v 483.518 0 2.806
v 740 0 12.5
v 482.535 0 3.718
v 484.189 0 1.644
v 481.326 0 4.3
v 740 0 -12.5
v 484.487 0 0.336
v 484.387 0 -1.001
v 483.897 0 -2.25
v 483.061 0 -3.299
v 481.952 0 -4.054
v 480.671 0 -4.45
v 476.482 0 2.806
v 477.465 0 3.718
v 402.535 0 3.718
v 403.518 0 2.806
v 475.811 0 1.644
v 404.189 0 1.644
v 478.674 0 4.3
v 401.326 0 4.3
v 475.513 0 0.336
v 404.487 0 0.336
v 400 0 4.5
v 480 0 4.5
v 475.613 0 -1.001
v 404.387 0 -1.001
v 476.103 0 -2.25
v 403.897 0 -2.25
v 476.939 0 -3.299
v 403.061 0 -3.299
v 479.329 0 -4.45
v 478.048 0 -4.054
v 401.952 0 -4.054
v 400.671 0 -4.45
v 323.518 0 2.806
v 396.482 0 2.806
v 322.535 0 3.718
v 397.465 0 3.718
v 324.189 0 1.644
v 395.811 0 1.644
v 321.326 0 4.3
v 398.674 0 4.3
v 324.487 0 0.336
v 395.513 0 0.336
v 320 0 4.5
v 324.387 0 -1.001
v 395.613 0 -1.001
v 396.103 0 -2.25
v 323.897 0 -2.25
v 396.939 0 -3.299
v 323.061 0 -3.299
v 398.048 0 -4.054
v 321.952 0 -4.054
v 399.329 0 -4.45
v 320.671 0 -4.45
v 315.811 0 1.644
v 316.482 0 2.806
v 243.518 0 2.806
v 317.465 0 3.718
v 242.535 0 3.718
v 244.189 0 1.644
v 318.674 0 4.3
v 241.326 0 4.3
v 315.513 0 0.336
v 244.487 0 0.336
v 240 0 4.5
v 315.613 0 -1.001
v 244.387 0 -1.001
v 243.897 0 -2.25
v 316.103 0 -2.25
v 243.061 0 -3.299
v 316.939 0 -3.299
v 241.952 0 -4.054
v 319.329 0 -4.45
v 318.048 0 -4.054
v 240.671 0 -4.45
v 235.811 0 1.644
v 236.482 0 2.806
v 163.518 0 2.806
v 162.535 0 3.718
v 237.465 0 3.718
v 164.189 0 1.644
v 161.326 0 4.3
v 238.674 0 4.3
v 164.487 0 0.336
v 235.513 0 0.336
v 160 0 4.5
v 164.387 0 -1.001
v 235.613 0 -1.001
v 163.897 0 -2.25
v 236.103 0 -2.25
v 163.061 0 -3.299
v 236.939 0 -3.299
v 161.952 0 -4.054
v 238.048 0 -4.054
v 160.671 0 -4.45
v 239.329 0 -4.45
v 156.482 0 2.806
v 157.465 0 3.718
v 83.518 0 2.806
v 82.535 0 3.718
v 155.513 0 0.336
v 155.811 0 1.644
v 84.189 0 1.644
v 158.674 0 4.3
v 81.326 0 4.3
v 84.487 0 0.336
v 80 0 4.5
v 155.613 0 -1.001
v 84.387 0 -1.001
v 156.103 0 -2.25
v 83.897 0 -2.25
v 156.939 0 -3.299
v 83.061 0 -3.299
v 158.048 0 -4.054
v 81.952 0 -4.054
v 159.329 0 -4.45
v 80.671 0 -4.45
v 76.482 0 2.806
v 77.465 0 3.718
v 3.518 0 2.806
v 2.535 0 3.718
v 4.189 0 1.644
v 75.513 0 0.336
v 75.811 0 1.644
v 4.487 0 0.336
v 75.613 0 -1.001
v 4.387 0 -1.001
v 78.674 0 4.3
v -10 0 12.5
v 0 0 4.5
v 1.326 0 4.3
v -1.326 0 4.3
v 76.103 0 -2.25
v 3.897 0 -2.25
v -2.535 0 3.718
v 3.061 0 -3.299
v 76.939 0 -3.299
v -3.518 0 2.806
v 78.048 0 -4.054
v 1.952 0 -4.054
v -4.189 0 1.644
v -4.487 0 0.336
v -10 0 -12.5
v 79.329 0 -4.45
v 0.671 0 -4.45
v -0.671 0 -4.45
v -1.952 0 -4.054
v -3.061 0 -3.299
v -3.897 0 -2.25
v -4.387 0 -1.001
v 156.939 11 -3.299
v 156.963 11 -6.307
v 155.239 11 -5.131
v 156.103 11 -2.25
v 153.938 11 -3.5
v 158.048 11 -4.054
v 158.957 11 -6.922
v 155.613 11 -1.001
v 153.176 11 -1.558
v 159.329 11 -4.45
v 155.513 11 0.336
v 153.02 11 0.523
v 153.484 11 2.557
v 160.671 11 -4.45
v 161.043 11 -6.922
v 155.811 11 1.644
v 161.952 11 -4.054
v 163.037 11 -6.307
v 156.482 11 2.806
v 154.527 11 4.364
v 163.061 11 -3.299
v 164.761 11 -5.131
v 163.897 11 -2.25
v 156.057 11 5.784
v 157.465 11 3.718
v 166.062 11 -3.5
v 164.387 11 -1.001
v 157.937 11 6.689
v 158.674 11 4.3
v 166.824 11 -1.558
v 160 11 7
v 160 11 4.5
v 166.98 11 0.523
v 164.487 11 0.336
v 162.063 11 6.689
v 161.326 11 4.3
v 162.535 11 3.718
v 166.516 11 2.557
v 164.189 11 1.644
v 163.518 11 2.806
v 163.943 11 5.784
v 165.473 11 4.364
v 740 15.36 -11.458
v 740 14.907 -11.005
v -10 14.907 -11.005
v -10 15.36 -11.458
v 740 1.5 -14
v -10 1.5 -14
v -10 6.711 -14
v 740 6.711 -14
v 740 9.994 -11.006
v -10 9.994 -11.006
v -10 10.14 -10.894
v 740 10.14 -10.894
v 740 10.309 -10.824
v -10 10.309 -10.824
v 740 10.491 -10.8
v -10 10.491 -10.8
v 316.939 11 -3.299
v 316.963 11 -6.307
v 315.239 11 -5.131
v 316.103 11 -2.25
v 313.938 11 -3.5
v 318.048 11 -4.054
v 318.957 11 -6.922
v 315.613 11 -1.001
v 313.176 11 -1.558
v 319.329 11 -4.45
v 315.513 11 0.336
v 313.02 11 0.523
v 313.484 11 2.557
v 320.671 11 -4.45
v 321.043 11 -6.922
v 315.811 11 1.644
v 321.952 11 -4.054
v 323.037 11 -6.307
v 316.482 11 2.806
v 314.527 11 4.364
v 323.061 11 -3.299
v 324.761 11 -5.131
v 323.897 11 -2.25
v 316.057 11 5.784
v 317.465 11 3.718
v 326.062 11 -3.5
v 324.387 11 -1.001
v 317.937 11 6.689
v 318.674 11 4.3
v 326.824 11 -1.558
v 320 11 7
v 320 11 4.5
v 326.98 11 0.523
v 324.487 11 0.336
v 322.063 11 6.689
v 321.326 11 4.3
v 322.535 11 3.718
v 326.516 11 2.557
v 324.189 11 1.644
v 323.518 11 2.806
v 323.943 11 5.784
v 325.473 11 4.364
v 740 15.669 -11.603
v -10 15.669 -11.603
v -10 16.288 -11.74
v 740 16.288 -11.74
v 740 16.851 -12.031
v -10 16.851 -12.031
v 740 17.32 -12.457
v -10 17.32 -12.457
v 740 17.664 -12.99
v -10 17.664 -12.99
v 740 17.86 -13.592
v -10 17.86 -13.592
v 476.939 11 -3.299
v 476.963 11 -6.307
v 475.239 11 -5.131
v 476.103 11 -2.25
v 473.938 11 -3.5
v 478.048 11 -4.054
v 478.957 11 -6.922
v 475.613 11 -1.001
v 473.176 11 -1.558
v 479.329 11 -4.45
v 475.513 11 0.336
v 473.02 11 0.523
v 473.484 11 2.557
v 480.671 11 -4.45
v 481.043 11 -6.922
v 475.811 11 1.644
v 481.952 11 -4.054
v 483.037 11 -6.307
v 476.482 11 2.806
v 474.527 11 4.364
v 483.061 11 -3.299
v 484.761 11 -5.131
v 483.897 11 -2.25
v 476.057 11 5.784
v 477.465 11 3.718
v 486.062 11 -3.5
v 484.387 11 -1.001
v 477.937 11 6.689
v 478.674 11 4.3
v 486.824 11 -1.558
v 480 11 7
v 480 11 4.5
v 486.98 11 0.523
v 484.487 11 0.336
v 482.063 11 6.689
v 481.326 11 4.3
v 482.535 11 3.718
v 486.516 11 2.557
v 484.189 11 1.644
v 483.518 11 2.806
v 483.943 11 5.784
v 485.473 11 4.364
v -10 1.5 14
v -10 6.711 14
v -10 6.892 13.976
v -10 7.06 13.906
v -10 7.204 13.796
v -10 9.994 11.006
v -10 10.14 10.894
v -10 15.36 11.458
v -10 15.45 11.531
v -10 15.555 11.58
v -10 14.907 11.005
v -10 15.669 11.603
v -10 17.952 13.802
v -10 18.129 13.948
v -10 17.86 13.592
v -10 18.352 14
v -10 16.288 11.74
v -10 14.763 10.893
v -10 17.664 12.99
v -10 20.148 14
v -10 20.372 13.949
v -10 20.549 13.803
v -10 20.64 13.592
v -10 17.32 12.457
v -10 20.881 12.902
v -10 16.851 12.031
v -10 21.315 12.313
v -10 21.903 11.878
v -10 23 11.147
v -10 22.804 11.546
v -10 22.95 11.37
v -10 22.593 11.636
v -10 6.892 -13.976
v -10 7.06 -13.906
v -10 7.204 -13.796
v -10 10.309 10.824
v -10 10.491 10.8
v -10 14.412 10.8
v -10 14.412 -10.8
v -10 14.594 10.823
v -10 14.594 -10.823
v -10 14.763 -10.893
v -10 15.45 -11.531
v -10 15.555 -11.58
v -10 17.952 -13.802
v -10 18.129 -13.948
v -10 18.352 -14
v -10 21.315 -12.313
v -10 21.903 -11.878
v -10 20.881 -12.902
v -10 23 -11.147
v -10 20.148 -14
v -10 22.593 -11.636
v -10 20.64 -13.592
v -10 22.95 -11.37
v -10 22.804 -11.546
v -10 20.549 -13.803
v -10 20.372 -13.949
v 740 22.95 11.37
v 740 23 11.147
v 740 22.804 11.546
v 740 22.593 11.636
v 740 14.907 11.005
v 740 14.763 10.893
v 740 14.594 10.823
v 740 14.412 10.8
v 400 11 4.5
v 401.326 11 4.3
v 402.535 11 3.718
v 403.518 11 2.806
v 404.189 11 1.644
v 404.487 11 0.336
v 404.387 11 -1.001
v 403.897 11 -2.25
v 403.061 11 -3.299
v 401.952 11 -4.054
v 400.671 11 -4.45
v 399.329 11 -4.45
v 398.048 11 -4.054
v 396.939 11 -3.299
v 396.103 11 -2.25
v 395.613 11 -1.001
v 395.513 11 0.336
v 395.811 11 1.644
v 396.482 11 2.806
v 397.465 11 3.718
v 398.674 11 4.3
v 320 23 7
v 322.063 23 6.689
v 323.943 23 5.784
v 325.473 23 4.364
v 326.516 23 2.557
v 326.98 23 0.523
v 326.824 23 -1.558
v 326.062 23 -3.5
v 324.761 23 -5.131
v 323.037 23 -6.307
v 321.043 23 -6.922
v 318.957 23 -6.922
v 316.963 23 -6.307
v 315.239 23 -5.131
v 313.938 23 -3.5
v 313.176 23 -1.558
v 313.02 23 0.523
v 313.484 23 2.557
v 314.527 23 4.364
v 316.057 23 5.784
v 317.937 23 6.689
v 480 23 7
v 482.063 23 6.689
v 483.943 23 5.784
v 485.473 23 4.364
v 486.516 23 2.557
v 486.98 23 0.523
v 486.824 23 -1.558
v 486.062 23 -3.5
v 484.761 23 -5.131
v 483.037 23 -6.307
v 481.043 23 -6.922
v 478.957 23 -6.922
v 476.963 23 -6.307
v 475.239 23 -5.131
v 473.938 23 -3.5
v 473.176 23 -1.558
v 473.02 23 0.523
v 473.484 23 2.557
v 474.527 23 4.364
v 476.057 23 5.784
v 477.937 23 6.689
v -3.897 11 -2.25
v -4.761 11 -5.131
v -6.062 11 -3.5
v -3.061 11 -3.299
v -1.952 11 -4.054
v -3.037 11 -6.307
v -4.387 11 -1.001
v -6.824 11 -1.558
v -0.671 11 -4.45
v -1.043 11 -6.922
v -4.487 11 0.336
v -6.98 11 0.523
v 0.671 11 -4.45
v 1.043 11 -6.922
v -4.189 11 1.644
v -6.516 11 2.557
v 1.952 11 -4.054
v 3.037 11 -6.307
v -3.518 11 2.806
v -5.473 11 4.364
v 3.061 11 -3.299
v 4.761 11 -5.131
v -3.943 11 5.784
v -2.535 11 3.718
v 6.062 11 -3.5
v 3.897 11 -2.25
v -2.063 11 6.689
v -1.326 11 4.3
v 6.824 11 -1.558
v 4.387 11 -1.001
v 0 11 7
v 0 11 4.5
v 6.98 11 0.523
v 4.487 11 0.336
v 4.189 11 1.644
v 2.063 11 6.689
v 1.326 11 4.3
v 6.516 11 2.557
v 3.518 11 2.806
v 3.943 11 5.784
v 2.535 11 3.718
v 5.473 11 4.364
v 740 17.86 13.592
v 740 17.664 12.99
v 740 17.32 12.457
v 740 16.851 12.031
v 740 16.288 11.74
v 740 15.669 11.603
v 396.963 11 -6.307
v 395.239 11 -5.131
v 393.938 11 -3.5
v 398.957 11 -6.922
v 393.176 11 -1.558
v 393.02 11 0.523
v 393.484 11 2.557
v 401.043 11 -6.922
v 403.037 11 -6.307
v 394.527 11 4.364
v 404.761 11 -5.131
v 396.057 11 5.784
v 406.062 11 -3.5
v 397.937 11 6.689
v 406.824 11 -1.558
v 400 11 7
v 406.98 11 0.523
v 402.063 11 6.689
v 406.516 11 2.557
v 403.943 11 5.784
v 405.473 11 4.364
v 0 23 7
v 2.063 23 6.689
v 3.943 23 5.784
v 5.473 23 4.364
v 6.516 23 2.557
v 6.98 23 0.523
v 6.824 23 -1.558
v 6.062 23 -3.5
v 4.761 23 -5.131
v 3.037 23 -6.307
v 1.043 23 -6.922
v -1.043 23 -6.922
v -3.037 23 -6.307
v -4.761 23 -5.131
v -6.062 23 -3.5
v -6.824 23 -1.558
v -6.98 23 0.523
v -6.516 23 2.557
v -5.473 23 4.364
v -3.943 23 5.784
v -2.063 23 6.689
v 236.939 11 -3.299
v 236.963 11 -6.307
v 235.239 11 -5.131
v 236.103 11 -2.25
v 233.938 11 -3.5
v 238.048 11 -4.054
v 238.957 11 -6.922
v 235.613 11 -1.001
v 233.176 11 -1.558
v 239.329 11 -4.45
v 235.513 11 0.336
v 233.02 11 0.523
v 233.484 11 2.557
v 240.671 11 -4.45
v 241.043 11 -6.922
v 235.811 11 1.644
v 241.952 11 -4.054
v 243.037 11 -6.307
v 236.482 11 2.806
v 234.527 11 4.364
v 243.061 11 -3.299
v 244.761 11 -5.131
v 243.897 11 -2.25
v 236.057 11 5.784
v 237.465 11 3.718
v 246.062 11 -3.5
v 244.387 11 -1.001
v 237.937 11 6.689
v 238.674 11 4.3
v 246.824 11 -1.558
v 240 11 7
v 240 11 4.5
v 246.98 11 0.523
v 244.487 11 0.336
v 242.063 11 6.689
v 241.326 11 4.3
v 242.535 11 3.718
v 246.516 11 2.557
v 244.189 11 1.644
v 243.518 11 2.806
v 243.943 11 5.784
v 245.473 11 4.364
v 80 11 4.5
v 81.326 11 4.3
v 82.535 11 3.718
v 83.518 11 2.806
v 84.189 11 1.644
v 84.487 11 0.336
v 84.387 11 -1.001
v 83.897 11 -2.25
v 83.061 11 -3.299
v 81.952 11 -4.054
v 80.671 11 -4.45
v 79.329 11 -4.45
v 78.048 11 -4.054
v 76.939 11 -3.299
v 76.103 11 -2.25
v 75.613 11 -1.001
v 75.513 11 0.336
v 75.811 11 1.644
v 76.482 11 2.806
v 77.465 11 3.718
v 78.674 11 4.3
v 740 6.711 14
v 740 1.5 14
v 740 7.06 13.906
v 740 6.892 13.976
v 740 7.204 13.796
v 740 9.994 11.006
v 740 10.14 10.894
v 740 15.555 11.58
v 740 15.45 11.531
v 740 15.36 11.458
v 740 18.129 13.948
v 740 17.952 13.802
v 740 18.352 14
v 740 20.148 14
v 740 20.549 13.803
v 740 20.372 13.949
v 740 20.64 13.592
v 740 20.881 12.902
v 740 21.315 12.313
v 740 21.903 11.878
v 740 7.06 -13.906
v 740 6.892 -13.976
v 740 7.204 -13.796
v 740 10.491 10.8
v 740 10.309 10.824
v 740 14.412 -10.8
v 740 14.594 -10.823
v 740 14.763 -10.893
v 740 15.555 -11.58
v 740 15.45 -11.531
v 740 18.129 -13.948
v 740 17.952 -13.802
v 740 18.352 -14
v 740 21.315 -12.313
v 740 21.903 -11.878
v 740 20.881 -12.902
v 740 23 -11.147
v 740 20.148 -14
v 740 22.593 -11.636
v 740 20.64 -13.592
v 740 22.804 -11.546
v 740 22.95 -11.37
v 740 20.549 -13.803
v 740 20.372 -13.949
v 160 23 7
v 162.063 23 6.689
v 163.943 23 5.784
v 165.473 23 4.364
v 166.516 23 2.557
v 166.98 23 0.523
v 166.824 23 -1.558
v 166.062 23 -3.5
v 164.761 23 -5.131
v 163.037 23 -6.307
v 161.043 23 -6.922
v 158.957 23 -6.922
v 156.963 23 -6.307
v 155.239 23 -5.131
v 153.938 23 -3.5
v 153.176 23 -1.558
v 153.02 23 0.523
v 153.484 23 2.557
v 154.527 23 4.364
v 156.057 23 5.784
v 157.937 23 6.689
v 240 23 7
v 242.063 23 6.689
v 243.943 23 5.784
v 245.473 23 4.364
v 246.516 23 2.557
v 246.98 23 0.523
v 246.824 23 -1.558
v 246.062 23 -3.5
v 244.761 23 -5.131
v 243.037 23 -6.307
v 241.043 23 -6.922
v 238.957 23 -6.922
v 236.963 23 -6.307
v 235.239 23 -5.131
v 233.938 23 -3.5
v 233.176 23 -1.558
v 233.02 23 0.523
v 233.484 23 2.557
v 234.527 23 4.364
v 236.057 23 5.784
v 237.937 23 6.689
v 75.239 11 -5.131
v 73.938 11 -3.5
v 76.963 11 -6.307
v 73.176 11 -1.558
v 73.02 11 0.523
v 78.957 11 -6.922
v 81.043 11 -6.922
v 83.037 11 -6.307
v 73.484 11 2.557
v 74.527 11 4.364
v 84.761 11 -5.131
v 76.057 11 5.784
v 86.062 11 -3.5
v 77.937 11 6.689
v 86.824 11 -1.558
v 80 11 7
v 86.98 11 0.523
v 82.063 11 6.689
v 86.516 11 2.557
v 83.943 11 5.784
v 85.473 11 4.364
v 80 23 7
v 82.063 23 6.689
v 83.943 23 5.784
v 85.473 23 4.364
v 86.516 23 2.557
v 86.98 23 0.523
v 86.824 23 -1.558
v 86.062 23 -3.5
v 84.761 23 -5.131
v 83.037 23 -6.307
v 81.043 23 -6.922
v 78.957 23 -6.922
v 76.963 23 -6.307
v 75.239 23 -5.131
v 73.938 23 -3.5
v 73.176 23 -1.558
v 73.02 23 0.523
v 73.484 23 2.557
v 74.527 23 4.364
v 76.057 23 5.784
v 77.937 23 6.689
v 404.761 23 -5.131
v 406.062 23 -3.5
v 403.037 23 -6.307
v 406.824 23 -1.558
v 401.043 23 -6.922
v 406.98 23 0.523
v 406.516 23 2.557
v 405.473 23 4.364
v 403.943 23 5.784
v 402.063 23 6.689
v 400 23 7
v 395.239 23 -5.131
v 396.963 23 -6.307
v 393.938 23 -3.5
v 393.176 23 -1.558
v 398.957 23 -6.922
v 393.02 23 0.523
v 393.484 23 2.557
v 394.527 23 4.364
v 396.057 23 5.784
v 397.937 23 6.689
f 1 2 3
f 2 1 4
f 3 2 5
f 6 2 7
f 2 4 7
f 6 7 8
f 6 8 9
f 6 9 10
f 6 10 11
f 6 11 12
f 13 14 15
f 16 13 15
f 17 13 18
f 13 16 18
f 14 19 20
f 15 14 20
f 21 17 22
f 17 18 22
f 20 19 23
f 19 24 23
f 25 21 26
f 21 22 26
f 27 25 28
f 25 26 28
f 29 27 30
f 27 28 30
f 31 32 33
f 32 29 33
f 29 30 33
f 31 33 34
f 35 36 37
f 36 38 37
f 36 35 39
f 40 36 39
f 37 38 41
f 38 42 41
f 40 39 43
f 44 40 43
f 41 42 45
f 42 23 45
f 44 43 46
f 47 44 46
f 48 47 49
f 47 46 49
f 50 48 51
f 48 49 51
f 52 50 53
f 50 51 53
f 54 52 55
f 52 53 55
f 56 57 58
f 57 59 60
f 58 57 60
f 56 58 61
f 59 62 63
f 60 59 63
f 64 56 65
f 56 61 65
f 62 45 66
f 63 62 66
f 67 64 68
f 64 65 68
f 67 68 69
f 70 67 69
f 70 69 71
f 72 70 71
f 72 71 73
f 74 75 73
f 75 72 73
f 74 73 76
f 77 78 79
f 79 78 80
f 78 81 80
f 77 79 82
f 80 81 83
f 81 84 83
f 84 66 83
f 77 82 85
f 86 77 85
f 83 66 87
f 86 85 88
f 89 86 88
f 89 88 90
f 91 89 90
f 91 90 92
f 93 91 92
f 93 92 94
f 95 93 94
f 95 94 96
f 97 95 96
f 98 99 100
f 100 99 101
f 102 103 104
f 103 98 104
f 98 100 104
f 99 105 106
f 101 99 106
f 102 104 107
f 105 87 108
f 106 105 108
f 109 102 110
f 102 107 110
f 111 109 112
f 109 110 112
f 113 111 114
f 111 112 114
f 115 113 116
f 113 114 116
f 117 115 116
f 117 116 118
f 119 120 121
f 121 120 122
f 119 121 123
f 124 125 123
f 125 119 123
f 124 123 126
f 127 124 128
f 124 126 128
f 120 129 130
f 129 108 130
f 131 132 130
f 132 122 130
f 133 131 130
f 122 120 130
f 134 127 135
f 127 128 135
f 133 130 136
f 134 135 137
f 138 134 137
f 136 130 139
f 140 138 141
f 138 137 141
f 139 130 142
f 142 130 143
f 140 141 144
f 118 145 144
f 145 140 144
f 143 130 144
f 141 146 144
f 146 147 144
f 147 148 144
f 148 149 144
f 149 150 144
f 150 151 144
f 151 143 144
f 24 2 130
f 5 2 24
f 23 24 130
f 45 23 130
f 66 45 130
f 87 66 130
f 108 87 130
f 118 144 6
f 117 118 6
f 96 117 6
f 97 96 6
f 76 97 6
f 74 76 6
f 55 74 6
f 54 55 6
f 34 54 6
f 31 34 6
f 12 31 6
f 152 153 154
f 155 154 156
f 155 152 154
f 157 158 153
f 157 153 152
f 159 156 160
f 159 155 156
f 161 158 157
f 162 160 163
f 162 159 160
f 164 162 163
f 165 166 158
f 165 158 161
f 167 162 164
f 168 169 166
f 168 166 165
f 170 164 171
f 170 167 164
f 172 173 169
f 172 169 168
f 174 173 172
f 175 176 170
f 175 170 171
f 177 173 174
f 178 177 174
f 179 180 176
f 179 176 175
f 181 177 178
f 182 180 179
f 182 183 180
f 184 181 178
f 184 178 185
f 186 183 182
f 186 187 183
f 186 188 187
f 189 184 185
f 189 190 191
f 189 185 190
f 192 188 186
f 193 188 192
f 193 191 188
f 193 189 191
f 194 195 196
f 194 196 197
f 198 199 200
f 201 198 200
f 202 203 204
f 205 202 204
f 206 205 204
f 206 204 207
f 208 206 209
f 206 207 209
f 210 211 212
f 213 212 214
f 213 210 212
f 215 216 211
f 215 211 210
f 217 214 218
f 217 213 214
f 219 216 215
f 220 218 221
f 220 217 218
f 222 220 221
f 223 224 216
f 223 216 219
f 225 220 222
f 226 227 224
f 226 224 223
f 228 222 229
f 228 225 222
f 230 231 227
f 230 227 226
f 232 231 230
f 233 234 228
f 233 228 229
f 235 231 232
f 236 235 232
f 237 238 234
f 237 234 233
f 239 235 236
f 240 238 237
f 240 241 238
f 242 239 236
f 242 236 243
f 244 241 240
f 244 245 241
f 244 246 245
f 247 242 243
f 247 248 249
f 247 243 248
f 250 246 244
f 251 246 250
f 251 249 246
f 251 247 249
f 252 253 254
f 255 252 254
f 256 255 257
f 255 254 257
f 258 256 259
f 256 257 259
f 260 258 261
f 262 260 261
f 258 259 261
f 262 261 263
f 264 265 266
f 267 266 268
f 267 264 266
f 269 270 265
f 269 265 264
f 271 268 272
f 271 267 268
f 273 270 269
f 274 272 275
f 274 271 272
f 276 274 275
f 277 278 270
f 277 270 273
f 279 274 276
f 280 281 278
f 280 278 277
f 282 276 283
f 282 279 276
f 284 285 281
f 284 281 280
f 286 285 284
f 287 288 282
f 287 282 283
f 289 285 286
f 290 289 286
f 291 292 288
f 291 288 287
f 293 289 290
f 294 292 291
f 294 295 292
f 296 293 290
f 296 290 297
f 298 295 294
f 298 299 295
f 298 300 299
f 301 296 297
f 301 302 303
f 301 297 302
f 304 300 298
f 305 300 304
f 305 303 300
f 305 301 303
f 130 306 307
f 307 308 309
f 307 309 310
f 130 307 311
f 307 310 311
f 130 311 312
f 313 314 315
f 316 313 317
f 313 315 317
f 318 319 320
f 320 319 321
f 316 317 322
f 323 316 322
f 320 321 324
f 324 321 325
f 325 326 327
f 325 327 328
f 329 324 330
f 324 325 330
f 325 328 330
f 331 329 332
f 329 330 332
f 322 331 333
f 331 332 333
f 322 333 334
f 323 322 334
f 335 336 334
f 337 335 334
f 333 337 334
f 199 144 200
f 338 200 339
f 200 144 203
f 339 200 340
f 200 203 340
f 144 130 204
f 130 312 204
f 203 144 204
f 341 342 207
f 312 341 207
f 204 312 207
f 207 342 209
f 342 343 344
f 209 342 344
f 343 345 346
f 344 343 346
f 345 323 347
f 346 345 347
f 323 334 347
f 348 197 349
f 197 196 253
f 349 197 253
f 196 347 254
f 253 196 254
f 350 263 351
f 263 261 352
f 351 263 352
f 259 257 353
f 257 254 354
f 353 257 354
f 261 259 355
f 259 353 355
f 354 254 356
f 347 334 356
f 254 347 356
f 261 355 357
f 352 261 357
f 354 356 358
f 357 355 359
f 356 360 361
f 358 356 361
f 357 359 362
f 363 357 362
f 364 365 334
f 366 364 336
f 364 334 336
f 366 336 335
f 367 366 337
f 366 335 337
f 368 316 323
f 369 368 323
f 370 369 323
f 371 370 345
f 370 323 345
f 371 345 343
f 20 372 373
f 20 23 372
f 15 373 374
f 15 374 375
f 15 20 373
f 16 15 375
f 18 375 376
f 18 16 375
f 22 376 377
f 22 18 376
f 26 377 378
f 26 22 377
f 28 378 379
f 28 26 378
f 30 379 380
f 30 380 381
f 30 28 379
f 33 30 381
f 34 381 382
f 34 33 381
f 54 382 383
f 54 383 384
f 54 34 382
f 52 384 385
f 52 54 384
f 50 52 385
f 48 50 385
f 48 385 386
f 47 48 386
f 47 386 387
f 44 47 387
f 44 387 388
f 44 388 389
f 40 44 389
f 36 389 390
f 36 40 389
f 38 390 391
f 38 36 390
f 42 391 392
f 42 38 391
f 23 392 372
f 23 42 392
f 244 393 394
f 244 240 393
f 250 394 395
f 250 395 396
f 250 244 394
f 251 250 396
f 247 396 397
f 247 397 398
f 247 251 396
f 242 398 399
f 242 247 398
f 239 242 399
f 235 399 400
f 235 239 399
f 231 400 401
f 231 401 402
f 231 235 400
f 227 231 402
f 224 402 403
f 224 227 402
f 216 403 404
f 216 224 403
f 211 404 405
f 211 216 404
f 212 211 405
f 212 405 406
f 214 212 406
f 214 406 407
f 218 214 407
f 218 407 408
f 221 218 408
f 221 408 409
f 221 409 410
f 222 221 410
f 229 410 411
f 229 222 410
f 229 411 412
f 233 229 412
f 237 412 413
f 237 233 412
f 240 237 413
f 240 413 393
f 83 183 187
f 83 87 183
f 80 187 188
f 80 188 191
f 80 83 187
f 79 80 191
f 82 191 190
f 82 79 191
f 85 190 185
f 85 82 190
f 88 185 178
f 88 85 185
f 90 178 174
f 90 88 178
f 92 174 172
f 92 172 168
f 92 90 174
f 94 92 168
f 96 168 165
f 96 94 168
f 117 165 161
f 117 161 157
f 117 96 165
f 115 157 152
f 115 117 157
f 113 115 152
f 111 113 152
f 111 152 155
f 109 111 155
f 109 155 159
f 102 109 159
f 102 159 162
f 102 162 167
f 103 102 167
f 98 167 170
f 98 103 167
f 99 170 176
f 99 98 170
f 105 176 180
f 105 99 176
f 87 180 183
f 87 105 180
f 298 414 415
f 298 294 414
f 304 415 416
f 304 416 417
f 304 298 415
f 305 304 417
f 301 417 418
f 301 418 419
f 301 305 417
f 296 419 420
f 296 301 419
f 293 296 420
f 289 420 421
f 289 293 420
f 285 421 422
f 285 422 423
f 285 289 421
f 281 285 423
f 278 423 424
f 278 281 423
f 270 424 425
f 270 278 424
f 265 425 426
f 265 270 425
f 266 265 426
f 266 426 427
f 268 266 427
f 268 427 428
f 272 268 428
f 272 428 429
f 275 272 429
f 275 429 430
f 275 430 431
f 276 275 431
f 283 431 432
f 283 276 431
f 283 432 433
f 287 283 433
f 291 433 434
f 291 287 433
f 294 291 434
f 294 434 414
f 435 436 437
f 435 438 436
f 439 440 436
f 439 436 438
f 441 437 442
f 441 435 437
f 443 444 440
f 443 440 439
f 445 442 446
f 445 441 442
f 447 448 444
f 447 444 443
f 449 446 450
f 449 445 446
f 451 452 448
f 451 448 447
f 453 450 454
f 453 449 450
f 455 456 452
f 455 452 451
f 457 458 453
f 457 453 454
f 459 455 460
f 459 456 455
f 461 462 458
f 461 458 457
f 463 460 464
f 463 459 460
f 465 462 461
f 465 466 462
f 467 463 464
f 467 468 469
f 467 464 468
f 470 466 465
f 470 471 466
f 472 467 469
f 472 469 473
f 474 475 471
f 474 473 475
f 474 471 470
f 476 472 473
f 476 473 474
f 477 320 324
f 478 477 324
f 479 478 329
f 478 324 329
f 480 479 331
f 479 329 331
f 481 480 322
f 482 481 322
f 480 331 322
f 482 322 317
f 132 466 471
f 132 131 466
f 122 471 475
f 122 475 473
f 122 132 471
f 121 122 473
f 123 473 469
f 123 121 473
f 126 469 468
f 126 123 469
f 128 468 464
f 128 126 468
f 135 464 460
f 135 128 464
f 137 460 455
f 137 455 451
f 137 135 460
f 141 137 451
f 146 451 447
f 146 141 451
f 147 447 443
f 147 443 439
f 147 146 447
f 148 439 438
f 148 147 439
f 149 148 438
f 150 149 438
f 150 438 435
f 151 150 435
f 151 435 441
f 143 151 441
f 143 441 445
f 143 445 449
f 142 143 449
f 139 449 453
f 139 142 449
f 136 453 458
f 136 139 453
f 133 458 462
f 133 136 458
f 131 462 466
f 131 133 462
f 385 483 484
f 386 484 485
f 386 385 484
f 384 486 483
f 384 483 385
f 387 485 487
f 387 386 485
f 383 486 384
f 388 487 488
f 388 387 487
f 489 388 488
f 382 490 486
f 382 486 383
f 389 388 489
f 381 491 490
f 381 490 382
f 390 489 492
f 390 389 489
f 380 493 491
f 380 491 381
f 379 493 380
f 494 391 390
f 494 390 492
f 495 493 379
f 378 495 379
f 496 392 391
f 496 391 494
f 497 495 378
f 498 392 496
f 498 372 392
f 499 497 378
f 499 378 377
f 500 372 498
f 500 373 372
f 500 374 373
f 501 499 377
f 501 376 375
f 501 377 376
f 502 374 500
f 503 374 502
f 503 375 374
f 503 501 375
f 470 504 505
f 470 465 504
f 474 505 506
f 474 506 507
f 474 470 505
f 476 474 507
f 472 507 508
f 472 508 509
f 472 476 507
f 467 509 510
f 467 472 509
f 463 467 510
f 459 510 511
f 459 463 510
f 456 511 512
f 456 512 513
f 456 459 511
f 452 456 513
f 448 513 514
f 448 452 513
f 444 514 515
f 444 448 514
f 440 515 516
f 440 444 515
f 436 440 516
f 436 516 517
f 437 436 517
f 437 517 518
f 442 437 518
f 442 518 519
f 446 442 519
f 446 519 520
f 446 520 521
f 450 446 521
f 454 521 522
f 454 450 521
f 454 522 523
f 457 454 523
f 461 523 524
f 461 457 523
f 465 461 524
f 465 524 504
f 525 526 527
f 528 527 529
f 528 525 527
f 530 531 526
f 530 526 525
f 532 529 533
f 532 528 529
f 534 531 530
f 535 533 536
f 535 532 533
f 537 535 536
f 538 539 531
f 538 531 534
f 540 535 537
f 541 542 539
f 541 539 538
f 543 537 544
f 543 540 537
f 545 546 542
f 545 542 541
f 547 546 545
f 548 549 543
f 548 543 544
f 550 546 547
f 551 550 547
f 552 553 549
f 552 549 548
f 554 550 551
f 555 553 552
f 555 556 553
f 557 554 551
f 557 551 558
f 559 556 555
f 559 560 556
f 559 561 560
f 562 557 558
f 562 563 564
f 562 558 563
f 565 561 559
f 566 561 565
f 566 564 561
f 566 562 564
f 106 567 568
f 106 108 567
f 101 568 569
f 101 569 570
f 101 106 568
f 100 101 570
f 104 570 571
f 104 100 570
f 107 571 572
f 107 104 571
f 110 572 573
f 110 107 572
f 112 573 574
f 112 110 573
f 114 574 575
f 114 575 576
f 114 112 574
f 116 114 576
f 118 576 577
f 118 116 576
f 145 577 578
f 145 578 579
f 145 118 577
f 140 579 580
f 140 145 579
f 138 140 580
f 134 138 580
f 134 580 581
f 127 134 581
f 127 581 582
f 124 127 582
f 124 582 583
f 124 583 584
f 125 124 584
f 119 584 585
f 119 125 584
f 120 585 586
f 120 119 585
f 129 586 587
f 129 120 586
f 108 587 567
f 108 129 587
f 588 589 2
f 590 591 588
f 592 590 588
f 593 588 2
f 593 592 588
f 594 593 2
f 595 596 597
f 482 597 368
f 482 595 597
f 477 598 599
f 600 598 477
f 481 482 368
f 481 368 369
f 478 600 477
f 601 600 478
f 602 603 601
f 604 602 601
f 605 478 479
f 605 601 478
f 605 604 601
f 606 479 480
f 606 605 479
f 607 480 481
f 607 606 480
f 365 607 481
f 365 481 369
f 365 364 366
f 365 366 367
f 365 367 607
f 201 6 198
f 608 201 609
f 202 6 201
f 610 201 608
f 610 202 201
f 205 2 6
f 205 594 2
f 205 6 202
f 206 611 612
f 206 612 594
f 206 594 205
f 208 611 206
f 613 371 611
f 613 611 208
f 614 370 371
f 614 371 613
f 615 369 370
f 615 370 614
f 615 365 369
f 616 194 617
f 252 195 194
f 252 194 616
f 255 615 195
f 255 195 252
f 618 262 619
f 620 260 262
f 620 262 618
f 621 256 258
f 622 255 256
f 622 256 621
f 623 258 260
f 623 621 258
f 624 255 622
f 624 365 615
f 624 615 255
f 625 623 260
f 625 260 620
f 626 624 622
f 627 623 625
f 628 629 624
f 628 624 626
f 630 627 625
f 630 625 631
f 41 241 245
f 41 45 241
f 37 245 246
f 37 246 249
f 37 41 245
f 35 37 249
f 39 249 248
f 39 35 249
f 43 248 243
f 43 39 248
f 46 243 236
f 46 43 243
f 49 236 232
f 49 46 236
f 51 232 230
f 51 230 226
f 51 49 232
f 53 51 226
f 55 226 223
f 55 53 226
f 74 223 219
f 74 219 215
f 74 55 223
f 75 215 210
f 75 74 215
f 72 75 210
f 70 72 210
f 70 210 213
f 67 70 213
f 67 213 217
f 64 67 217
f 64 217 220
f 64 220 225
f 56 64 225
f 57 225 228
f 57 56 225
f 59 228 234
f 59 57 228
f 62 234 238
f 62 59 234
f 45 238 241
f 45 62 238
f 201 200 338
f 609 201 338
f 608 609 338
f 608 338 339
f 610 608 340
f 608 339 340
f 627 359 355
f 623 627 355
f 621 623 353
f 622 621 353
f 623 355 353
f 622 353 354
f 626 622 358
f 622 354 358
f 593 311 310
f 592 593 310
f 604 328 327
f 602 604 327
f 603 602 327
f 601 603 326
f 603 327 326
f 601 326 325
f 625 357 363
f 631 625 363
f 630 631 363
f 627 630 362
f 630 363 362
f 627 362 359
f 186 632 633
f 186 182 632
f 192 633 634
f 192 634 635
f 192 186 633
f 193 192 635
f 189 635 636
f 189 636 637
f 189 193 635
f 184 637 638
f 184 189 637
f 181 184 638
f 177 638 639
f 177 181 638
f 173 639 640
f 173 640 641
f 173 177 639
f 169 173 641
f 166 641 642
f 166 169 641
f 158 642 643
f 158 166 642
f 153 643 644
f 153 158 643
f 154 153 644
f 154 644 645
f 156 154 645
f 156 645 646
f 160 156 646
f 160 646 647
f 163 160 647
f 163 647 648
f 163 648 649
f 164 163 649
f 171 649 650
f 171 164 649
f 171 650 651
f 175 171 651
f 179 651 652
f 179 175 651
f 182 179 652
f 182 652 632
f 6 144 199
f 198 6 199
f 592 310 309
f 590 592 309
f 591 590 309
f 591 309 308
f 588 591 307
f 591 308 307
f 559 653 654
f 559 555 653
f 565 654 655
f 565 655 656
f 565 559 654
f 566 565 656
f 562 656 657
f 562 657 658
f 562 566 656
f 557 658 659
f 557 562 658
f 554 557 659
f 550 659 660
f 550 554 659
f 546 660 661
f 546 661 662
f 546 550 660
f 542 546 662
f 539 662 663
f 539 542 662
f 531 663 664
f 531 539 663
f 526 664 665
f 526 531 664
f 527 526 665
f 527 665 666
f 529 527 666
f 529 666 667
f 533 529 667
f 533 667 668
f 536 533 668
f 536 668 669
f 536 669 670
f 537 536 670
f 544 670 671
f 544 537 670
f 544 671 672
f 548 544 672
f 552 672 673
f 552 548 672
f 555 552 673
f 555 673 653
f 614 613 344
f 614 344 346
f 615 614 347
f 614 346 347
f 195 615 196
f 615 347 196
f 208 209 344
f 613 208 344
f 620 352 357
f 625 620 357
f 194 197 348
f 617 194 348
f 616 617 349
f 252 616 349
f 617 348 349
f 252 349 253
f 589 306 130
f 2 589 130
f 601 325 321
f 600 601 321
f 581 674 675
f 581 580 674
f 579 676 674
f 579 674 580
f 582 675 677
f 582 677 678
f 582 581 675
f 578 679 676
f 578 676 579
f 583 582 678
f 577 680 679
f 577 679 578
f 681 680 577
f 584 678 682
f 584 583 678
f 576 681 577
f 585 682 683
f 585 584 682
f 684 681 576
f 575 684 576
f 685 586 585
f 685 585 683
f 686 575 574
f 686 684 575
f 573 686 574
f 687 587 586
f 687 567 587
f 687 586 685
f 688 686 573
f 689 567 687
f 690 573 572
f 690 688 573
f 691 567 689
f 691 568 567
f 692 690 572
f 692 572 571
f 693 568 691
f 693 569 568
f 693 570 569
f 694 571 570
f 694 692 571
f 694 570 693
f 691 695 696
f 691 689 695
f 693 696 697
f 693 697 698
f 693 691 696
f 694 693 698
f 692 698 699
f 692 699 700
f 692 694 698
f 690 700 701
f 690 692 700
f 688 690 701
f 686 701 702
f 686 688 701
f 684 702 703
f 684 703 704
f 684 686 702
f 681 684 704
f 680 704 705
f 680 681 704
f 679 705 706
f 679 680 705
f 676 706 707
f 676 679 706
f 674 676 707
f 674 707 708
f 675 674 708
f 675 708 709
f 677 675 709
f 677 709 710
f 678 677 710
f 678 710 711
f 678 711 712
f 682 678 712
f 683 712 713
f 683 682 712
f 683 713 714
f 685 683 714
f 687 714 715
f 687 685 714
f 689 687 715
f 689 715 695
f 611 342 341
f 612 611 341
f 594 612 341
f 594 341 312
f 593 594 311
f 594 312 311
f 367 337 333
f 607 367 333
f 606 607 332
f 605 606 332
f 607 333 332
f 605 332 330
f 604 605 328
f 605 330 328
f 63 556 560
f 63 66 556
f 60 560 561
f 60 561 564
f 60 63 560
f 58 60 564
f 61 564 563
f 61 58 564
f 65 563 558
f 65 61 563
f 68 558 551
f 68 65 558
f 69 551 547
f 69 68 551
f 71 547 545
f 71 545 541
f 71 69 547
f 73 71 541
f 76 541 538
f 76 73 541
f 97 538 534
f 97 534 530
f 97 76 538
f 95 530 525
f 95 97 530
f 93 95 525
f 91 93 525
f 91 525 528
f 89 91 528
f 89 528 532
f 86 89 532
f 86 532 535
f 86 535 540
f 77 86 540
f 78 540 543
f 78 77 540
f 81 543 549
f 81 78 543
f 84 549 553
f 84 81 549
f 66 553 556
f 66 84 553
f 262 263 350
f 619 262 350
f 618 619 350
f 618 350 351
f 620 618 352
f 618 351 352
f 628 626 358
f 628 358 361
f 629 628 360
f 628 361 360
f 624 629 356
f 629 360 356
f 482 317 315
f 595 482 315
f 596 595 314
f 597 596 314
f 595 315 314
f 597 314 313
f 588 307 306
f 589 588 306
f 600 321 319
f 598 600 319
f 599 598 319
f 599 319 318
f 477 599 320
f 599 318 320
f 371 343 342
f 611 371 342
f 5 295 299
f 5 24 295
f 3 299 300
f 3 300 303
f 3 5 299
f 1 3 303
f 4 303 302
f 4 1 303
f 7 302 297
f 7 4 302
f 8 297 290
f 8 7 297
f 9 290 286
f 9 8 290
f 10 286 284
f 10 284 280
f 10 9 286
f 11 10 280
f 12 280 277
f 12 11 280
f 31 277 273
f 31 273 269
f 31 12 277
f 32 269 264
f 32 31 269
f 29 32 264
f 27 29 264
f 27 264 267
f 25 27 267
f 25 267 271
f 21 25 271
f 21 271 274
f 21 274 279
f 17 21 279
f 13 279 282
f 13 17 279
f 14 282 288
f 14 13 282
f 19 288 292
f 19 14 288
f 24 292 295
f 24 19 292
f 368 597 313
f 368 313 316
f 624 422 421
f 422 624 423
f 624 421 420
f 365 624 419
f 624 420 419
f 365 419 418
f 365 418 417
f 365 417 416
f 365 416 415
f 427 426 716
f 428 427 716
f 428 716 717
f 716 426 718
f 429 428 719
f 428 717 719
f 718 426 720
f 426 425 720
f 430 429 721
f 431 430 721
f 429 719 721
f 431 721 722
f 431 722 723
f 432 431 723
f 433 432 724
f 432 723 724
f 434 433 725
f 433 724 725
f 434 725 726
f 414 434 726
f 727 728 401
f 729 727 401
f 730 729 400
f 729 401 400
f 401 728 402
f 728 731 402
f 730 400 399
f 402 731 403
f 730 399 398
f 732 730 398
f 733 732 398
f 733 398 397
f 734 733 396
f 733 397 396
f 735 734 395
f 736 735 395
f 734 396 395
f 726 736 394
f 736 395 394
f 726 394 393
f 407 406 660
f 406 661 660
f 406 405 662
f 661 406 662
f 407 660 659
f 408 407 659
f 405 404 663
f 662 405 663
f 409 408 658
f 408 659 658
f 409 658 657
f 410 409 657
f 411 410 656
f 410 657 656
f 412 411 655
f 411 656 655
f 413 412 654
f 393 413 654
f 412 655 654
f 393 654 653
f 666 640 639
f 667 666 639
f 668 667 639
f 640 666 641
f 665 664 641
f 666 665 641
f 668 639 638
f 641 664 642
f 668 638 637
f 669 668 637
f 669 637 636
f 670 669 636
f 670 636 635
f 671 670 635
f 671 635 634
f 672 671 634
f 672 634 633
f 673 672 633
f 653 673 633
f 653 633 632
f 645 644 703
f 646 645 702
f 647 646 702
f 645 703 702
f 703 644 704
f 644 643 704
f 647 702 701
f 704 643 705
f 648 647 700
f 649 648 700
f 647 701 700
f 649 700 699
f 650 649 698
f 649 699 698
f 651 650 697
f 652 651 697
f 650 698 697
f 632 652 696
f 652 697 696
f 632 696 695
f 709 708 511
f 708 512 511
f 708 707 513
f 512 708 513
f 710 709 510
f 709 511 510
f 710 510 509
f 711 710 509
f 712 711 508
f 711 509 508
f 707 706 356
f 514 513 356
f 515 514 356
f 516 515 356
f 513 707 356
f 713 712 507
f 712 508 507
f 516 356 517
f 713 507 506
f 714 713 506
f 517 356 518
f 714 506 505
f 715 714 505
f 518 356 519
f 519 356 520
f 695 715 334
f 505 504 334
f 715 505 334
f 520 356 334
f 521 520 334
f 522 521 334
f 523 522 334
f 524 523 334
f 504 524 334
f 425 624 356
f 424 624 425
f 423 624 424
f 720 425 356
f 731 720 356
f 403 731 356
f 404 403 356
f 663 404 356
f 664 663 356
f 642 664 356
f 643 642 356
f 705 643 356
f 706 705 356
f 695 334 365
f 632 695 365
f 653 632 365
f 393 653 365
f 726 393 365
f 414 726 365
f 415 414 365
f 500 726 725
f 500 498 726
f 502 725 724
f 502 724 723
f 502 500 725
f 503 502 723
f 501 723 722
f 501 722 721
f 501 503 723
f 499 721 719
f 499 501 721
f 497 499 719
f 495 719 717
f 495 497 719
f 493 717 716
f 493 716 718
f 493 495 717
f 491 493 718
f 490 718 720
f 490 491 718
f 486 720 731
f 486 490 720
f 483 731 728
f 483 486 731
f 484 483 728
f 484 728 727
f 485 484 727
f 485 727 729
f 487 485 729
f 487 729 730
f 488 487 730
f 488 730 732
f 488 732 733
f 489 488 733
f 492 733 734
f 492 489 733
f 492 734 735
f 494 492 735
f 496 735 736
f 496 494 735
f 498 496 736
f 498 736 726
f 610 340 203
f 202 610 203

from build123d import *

# Parameters (mm, degrees)
BOSS_EXTRUDE1_DEPTH = 750


with BuildPart() as part:
    # Sketch1 → Boss-Extrude1 (new body)
    with BuildSketch(Plane(origin=(-10, 0, 0), x_dir=(0, 0, -1), z_dir=(1, 0, 0))):
        with BuildLine():
            Line((-14, 20.148439), (-14, 18.35158))
            ThreePointArc((-14, 18.35158), (-13.885407957, 18.031881418), (-13.592386868, 17.860192277))
            ThreePointArc((-13.592386868, 17.860192277), (-12.229021504, 17.099202354), (-11.602627372, 15.66899217))
            ThreePointArc((-11.602627372, 15.66899217), (-11.559004129, 15.501191683), (-11.458152391, 15.360163609))
            Line((-11.458152391, 15.360163609), (-11.005017, 14.906991))
            ThreePointArc((-11.005017, 14.906991), (-10.852063473, 14.680418582), (-10.800003, 14.412054))
            Line((-10.800003, 14.412054), (-10.800003, 10.490777069))
            ThreePointArc((-10.800003, 10.490777069), (-10.853443426, 10.222114259), (-11.005628687, 9.994352913))
            Line((-11.005628687, 9.994352913), (-13.795574427, 7.204407575))
            ThreePointArc((-13.795574427, 7.204407575), (-13.946871354, 6.977976046), (-14, 6.710881784))
            Line((-14, 6.710881784), (-14, 1.5))
            Line((-14, 1.5), (-12.5, 0))
            Line((-12.5, 0), (12.5, 0))
            Line((12.5, 0), (14, 1.5))
            Line((14, 1.5), (14, 6.710881784))
            ThreePointArc((14, 6.710881784), (13.946871354, 6.977976046), (13.795574427, 7.204407575))
            Line((13.795574427, 7.204407575), (11.005628687, 9.994352913))
            ThreePointArc((11.005628687, 9.994352913), (10.853443426, 10.222114259), (10.800003, 10.490777069))
            Line((10.800003, 10.490777069), (10.800003, 14.412054))
            ThreePointArc((10.800003, 14.412054), (10.852063473, 14.680418582), (11.005017, 14.906991))
            Line((11.005017, 14.906991), (11.458152391, 15.360163609))
            ThreePointArc((11.458152391, 15.360163609), (11.559004129, 15.501191683), (11.602627372, 15.66899217))
            ThreePointArc((11.602627372, 15.66899217), (12.229021504, 17.099202354), (13.592386868, 17.860192277))
            ThreePointArc((13.592386868, 17.860192277), (13.885407957, 18.031881418), (14, 18.35158))
            Line((14, 18.35158), (14, 20.148439))
            ThreePointArc((14, 20.148439), (13.886532321, 20.469052961), (13.5924176, 20.639829881))
            ThreePointArc((13.5924176, 20.639829881), (12.312672018, 21.314596081), (11.635789981, 22.593223817))
            ThreePointArc((11.635789981, 22.593223817), (11.466717508, 22.887148006), (11.146965482, 23))
            Line((11.146965482, 23), (-11.146965482, 23))
            ThreePointArc((-11.146965482, 23), (-11.466717508, 22.887148006), (-11.635789981, 22.593223817))
            ThreePointArc((-11.635789981, 22.593223817), (-12.312672018, 21.314596081), (-13.5924176, 20.639829881))
            ThreePointArc((-13.5924176, 20.639829881), (-13.886532321, 20.469052961), (-14, 20.148439))
        make_face()
    extrude(amount=BOSS_EXTRUDE1_DEPTH)

    # Sketch2 → Cut-Revolve1 (revolve, cut)
    with BuildSketch(Plane.XY, mode=Mode.PRIVATE) as cut_revolve1_sk:
        Polygon((0, 23), (7, 23), (7, 11), (4.5, 11), (4.5, 0), (0, 0), align=None)
    revolve(cut_revolve1_sk.sketch.rotate(Axis((0, 0, 0), (0, 1, 0)), 270), axis=Axis((0, 0, 0), (0, 1, 0)), mode=Mode.SUBTRACT)

    # Sketch3 → Cut-Revolve2 (revolve, cut)
    with BuildSketch(Plane.XY, mode=Mode.PRIVATE) as cut_revolve2_sk:
        Polygon((80, 23), (87, 23), (87, 11), (84.5, 11), (84.5, 0), (80, 0), align=None)
    revolve(cut_revolve2_sk.sketch.rotate(Axis((80, 0, 0), (0, 1, 0)), 270), axis=Axis((80, 0, 0), (0, 1, 0)), mode=Mode.SUBTRACT)

    # Sketch4 → Cut-Revolve3 (revolve, cut)
    with BuildSketch(Plane.XY, mode=Mode.PRIVATE) as cut_revolve3_sk:
        Polygon((160, 23), (167, 23), (167, 11), (164.5, 11), (164.5, 0), (160, 0), align=None)
    revolve(cut_revolve3_sk.sketch.rotate(Axis((160, 0, 0), (0, 1, 0)), 270), axis=Axis((160, 0, 0), (0, 1, 0)), mode=Mode.SUBTRACT)

    # Sketch5 → Cut-Revolve4 (revolve, cut)
    with BuildSketch(Plane.XY, mode=Mode.PRIVATE) as cut_revolve4_sk:
        Polygon((240, 23), (247, 23), (247, 11), (244.5, 11), (244.5, 0), (240, 0), align=None)
    revolve(cut_revolve4_sk.sketch.rotate(Axis((240, 0, 0), (0, 1, 0)), 270), axis=Axis((240, 0, 0), (0, 1, 0)), mode=Mode.SUBTRACT)

    # Sketch6 → Cut-Revolve5 (revolve, cut)
    with BuildSketch(Plane.XY, mode=Mode.PRIVATE) as cut_revolve5_sk:
        Polygon((320, 23), (327, 23), (327, 11), (324.5, 11), (324.5, 0), (320, 0), align=None)
    revolve(cut_revolve5_sk.sketch.rotate(Axis((320, 0, 0), (0, 1, 0)), 270), axis=Axis((320, 0, 0), (0, 1, 0)), mode=Mode.SUBTRACT)

    # Sketch7 → Cut-Revolve6 (revolve, cut)
    with BuildSketch(Plane.XY, mode=Mode.PRIVATE) as cut_revolve6_sk:
        Polygon((400, 23), (407, 23), (407, 11), (404.5, 11), (404.5, 0), (400, 0), align=None)
    revolve(cut_revolve6_sk.sketch.rotate(Axis((400, 0, 0), (0, 1, 0)), 270), axis=Axis((400, 0, 0), (0, 1, 0)), mode=Mode.SUBTRACT)

    # Sketch8 → Cut-Revolve7 (revolve, cut)
    with BuildSketch(Plane.XY, mode=Mode.PRIVATE) as cut_revolve7_sk:
        Polygon((480, 23), (487, 23), (487, 11), (484.5, 11), (484.5, 0), (480, 0), align=None)
    revolve(cut_revolve7_sk.sketch.rotate(Axis((480, 0, 0), (0, 1, 0)), 270), axis=Axis((480, 0, 0), (0, 1, 0)), mode=Mode.SUBTRACT)


solid = part.part
